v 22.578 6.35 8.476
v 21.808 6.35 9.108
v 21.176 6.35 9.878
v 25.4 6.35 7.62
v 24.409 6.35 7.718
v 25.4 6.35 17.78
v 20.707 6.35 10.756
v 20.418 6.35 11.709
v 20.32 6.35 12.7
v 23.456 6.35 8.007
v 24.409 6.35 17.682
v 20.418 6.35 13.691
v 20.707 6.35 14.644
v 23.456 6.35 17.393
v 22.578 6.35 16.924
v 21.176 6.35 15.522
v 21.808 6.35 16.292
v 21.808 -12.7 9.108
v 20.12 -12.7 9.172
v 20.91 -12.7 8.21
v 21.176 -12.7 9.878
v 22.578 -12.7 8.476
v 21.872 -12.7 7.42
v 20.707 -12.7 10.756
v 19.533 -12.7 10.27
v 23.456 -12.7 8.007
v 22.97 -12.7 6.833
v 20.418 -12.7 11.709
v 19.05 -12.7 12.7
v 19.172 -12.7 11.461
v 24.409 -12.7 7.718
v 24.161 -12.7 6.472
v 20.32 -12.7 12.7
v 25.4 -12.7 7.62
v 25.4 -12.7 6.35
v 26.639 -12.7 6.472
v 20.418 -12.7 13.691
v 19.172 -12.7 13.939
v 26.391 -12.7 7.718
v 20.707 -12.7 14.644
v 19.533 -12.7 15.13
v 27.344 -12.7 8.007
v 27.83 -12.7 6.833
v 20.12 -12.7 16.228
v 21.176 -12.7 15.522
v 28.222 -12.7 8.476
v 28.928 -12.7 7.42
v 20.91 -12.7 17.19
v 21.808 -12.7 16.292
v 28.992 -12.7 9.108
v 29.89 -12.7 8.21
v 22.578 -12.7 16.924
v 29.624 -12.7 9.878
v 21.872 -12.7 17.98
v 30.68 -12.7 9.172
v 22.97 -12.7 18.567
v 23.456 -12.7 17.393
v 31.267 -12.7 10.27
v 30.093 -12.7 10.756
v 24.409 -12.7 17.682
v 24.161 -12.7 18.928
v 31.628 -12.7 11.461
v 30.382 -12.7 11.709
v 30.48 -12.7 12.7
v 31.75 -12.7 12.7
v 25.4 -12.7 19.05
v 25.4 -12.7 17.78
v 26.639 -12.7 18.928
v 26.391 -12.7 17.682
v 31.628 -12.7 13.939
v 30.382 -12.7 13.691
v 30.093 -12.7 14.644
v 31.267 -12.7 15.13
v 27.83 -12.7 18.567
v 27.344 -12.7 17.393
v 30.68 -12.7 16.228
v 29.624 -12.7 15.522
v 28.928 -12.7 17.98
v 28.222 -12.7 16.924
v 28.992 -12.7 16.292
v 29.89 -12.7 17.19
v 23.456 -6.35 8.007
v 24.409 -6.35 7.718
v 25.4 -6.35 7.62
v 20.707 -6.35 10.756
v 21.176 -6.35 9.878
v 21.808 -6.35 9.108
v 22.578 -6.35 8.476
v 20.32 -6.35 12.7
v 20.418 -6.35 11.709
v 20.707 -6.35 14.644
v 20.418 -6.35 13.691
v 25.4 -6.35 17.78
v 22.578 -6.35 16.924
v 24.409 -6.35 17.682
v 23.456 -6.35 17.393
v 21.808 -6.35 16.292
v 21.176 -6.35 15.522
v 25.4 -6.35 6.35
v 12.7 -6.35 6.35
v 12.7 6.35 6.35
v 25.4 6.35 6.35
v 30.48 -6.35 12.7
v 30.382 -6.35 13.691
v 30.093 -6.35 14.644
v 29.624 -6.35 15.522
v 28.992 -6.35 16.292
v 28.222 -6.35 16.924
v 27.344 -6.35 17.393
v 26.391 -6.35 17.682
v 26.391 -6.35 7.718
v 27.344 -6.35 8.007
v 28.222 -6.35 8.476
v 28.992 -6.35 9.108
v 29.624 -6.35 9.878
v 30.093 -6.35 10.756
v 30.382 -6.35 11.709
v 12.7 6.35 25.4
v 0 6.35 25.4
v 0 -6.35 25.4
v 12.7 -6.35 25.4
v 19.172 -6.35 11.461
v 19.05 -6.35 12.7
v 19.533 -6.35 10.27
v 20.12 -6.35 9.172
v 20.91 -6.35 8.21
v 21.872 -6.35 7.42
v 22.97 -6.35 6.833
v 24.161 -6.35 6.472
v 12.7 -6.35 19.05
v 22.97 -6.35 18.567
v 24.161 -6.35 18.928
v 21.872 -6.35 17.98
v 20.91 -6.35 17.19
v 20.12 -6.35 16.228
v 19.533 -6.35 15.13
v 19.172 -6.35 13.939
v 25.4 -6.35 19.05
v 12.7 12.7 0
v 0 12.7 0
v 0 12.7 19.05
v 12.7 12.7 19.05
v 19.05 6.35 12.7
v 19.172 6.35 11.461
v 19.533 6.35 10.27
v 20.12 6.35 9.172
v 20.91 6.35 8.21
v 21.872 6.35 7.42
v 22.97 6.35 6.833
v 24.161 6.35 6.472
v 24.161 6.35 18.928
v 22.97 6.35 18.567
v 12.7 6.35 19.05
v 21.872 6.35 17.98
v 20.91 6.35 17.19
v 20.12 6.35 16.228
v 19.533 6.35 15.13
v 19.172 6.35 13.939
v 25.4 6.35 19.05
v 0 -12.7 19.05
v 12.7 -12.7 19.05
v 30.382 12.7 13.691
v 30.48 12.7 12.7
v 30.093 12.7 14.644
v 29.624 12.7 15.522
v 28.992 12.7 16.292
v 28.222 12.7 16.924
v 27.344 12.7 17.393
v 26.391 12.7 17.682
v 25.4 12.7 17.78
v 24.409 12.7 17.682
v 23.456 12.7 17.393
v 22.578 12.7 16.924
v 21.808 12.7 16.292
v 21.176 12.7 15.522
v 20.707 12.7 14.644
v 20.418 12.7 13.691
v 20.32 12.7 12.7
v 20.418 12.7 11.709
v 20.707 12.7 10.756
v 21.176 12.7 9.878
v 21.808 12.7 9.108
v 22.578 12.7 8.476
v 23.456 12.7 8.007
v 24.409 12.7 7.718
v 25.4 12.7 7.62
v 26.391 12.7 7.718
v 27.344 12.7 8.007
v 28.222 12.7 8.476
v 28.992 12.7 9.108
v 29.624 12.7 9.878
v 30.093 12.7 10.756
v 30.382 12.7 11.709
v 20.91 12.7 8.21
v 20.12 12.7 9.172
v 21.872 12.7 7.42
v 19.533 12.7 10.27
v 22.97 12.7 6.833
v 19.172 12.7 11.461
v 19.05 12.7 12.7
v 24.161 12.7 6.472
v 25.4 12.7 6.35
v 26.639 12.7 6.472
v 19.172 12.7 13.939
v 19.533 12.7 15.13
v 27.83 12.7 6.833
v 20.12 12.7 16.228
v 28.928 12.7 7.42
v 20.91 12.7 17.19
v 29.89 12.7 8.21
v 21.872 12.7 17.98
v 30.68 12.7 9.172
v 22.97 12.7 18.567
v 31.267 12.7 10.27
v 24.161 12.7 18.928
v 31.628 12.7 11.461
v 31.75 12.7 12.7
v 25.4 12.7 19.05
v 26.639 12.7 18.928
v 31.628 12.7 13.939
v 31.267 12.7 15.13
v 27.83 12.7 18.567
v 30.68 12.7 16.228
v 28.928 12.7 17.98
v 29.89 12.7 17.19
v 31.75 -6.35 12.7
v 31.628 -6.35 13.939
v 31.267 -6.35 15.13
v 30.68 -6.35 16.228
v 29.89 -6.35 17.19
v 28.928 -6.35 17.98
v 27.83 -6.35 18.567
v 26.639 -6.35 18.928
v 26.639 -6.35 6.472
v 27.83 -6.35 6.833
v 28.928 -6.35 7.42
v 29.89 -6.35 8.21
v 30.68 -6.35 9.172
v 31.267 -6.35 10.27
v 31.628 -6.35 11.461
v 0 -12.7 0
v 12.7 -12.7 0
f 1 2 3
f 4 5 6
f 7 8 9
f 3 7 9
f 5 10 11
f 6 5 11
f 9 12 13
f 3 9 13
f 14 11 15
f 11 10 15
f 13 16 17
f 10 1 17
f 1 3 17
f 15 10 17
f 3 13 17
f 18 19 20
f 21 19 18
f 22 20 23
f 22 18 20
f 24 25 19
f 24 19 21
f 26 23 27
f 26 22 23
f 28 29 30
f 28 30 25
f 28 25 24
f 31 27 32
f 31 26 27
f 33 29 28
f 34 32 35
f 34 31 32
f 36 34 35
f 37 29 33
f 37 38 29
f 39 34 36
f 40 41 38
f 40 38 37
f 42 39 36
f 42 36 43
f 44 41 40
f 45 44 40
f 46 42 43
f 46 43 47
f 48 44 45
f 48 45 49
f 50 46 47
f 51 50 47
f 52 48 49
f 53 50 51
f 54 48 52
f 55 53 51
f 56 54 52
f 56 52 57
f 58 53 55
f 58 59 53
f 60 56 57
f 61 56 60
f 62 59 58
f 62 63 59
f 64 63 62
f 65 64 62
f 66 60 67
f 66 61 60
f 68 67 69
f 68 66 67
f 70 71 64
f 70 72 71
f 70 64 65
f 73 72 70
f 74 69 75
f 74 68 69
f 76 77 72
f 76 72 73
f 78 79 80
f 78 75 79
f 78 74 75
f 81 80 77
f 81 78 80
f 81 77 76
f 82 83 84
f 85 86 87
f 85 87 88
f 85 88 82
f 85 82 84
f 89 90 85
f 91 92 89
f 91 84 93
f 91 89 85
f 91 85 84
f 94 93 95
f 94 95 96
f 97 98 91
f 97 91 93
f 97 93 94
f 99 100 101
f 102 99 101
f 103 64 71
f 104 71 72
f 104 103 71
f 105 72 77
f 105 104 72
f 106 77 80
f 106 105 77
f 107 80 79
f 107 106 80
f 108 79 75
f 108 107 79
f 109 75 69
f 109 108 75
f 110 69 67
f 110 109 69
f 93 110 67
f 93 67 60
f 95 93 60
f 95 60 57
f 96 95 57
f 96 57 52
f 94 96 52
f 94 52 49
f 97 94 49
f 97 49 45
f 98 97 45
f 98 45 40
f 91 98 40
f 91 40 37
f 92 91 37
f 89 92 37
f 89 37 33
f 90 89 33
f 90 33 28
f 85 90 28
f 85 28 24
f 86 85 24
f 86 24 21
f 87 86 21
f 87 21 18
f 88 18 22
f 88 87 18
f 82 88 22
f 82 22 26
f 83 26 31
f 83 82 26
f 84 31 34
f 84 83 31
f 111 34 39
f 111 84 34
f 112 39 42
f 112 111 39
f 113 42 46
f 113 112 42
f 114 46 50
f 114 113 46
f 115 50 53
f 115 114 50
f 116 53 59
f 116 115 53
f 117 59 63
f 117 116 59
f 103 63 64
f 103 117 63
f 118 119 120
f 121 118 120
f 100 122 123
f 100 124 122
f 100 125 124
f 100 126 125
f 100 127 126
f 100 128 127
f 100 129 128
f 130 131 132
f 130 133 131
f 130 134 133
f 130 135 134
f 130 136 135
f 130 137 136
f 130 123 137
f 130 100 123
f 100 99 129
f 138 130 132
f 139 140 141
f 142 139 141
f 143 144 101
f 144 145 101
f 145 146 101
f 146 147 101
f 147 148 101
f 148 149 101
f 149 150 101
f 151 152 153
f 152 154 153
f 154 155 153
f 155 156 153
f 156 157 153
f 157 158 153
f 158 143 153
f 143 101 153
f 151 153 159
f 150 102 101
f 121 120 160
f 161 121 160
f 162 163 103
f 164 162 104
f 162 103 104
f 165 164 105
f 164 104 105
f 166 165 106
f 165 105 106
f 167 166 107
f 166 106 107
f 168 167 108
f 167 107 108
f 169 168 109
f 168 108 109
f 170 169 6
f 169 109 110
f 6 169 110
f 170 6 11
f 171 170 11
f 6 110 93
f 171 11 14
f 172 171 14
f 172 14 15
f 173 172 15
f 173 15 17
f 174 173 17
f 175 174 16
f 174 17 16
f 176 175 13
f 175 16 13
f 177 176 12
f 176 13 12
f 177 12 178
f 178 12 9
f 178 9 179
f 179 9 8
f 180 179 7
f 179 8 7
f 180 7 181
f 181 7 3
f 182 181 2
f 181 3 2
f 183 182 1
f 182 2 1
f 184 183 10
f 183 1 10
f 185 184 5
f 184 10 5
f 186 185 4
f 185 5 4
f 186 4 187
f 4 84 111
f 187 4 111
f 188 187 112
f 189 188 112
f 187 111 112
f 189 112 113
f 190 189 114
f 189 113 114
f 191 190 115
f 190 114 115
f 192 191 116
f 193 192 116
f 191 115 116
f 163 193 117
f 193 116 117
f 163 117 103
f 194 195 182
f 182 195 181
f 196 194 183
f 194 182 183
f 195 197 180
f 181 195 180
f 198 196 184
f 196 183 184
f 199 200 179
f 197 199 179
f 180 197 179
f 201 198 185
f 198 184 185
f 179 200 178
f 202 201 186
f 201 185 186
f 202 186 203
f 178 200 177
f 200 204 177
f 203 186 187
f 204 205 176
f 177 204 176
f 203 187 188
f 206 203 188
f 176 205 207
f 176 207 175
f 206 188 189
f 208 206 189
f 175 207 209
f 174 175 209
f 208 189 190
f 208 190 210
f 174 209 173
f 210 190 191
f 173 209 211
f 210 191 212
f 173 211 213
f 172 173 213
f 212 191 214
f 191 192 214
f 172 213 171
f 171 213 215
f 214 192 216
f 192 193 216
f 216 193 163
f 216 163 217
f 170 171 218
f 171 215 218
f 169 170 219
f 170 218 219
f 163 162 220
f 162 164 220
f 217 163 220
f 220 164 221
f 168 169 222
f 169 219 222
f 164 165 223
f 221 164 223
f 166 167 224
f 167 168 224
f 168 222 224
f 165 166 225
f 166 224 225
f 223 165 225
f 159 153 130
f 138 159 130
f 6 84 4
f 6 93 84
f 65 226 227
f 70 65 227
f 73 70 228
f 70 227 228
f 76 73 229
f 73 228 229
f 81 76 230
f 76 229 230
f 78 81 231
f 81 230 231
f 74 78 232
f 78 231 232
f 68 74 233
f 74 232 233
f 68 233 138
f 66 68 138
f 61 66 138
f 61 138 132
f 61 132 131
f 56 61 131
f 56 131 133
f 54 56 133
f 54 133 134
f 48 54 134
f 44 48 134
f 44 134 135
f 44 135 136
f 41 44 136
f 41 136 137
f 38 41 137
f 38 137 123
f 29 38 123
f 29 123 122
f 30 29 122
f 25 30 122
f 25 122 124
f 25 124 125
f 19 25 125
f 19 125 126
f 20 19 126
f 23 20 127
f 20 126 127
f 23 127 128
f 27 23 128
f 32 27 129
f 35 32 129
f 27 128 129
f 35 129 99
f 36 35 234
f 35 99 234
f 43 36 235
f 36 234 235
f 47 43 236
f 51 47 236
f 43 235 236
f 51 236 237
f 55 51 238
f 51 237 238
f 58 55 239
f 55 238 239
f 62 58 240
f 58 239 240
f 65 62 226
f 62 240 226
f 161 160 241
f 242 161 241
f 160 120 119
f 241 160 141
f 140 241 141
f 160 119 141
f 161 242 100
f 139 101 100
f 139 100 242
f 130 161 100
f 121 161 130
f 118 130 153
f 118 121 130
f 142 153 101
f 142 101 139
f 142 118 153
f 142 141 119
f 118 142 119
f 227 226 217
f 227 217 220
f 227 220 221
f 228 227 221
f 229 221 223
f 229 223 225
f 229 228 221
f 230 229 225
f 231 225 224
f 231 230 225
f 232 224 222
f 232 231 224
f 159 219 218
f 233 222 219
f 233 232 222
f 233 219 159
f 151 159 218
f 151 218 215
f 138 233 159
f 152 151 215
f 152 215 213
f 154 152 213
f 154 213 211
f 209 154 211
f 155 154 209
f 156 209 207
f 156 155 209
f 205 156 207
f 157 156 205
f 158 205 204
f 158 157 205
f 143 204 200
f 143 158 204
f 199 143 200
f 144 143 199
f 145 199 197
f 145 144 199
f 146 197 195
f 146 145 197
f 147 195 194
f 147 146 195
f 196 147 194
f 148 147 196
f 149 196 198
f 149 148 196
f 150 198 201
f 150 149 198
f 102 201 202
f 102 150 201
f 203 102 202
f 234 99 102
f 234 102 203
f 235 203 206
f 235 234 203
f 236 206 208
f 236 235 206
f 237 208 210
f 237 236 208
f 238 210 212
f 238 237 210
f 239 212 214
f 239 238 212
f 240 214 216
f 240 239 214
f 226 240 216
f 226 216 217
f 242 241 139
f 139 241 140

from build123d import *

# Parameters (mm, degrees)
F1_DEPTH      = 12.7
F0_W          = 6.35
F0_H          = 12.7
F2_DEPTH      = 25.4
F3_R          = 6.35
F3_R_2        = 5.08
F4_DEPTH      = 6.35
F4_DEPTH_BACK = 19.05


with BuildPart() as f1:
    # F0 (on Right) → F1 (new body)
    with BuildSketch(Plane.YZ):
        Polygon((-6.35, 19.05), (0, 19.05), (0, 25.4), (-6.35, 25.4), (-12.7, 19.05), (-12.7, 0), (0, 0), (0, 6.35), (-6.35, 6.35), align=None)
        Polygon((0, 25.4), (0, 19.05), (6.35, 19.05), (6.35, 6.35), (0, 6.35), (0, 0), (12.7, 0), (12.7, 19.05), (6.35, 25.4), align=None)
    extrude(amount=F1_DEPTH)

    # F0 (on Right) → F2 (join)
    with BuildSketch(Plane.YZ):
        with Locations((3.175, 12.7)):
            Rectangle(F0_W, F0_H)
        with Locations((-3.175, 12.7)):
            Rectangle(F0_W, F0_H)
    extrude(amount=F2_DEPTH)

    # F3 (on face) → F4 (join, two sides)
    with BuildSketch(Plane.XZ.offset(6.35)) as f4_sk:
        with Locations((25.4, 12.7)):
            Circle(F3_R)
        with Locations((25.4, 12.7)):
            Circle(F3_R_2, mode=Mode.SUBTRACT)
    extrude(amount=F4_DEPTH)
    extrude(f4_sk.sketch, amount=-F4_DEPTH_BACK)


solid = f1.part
